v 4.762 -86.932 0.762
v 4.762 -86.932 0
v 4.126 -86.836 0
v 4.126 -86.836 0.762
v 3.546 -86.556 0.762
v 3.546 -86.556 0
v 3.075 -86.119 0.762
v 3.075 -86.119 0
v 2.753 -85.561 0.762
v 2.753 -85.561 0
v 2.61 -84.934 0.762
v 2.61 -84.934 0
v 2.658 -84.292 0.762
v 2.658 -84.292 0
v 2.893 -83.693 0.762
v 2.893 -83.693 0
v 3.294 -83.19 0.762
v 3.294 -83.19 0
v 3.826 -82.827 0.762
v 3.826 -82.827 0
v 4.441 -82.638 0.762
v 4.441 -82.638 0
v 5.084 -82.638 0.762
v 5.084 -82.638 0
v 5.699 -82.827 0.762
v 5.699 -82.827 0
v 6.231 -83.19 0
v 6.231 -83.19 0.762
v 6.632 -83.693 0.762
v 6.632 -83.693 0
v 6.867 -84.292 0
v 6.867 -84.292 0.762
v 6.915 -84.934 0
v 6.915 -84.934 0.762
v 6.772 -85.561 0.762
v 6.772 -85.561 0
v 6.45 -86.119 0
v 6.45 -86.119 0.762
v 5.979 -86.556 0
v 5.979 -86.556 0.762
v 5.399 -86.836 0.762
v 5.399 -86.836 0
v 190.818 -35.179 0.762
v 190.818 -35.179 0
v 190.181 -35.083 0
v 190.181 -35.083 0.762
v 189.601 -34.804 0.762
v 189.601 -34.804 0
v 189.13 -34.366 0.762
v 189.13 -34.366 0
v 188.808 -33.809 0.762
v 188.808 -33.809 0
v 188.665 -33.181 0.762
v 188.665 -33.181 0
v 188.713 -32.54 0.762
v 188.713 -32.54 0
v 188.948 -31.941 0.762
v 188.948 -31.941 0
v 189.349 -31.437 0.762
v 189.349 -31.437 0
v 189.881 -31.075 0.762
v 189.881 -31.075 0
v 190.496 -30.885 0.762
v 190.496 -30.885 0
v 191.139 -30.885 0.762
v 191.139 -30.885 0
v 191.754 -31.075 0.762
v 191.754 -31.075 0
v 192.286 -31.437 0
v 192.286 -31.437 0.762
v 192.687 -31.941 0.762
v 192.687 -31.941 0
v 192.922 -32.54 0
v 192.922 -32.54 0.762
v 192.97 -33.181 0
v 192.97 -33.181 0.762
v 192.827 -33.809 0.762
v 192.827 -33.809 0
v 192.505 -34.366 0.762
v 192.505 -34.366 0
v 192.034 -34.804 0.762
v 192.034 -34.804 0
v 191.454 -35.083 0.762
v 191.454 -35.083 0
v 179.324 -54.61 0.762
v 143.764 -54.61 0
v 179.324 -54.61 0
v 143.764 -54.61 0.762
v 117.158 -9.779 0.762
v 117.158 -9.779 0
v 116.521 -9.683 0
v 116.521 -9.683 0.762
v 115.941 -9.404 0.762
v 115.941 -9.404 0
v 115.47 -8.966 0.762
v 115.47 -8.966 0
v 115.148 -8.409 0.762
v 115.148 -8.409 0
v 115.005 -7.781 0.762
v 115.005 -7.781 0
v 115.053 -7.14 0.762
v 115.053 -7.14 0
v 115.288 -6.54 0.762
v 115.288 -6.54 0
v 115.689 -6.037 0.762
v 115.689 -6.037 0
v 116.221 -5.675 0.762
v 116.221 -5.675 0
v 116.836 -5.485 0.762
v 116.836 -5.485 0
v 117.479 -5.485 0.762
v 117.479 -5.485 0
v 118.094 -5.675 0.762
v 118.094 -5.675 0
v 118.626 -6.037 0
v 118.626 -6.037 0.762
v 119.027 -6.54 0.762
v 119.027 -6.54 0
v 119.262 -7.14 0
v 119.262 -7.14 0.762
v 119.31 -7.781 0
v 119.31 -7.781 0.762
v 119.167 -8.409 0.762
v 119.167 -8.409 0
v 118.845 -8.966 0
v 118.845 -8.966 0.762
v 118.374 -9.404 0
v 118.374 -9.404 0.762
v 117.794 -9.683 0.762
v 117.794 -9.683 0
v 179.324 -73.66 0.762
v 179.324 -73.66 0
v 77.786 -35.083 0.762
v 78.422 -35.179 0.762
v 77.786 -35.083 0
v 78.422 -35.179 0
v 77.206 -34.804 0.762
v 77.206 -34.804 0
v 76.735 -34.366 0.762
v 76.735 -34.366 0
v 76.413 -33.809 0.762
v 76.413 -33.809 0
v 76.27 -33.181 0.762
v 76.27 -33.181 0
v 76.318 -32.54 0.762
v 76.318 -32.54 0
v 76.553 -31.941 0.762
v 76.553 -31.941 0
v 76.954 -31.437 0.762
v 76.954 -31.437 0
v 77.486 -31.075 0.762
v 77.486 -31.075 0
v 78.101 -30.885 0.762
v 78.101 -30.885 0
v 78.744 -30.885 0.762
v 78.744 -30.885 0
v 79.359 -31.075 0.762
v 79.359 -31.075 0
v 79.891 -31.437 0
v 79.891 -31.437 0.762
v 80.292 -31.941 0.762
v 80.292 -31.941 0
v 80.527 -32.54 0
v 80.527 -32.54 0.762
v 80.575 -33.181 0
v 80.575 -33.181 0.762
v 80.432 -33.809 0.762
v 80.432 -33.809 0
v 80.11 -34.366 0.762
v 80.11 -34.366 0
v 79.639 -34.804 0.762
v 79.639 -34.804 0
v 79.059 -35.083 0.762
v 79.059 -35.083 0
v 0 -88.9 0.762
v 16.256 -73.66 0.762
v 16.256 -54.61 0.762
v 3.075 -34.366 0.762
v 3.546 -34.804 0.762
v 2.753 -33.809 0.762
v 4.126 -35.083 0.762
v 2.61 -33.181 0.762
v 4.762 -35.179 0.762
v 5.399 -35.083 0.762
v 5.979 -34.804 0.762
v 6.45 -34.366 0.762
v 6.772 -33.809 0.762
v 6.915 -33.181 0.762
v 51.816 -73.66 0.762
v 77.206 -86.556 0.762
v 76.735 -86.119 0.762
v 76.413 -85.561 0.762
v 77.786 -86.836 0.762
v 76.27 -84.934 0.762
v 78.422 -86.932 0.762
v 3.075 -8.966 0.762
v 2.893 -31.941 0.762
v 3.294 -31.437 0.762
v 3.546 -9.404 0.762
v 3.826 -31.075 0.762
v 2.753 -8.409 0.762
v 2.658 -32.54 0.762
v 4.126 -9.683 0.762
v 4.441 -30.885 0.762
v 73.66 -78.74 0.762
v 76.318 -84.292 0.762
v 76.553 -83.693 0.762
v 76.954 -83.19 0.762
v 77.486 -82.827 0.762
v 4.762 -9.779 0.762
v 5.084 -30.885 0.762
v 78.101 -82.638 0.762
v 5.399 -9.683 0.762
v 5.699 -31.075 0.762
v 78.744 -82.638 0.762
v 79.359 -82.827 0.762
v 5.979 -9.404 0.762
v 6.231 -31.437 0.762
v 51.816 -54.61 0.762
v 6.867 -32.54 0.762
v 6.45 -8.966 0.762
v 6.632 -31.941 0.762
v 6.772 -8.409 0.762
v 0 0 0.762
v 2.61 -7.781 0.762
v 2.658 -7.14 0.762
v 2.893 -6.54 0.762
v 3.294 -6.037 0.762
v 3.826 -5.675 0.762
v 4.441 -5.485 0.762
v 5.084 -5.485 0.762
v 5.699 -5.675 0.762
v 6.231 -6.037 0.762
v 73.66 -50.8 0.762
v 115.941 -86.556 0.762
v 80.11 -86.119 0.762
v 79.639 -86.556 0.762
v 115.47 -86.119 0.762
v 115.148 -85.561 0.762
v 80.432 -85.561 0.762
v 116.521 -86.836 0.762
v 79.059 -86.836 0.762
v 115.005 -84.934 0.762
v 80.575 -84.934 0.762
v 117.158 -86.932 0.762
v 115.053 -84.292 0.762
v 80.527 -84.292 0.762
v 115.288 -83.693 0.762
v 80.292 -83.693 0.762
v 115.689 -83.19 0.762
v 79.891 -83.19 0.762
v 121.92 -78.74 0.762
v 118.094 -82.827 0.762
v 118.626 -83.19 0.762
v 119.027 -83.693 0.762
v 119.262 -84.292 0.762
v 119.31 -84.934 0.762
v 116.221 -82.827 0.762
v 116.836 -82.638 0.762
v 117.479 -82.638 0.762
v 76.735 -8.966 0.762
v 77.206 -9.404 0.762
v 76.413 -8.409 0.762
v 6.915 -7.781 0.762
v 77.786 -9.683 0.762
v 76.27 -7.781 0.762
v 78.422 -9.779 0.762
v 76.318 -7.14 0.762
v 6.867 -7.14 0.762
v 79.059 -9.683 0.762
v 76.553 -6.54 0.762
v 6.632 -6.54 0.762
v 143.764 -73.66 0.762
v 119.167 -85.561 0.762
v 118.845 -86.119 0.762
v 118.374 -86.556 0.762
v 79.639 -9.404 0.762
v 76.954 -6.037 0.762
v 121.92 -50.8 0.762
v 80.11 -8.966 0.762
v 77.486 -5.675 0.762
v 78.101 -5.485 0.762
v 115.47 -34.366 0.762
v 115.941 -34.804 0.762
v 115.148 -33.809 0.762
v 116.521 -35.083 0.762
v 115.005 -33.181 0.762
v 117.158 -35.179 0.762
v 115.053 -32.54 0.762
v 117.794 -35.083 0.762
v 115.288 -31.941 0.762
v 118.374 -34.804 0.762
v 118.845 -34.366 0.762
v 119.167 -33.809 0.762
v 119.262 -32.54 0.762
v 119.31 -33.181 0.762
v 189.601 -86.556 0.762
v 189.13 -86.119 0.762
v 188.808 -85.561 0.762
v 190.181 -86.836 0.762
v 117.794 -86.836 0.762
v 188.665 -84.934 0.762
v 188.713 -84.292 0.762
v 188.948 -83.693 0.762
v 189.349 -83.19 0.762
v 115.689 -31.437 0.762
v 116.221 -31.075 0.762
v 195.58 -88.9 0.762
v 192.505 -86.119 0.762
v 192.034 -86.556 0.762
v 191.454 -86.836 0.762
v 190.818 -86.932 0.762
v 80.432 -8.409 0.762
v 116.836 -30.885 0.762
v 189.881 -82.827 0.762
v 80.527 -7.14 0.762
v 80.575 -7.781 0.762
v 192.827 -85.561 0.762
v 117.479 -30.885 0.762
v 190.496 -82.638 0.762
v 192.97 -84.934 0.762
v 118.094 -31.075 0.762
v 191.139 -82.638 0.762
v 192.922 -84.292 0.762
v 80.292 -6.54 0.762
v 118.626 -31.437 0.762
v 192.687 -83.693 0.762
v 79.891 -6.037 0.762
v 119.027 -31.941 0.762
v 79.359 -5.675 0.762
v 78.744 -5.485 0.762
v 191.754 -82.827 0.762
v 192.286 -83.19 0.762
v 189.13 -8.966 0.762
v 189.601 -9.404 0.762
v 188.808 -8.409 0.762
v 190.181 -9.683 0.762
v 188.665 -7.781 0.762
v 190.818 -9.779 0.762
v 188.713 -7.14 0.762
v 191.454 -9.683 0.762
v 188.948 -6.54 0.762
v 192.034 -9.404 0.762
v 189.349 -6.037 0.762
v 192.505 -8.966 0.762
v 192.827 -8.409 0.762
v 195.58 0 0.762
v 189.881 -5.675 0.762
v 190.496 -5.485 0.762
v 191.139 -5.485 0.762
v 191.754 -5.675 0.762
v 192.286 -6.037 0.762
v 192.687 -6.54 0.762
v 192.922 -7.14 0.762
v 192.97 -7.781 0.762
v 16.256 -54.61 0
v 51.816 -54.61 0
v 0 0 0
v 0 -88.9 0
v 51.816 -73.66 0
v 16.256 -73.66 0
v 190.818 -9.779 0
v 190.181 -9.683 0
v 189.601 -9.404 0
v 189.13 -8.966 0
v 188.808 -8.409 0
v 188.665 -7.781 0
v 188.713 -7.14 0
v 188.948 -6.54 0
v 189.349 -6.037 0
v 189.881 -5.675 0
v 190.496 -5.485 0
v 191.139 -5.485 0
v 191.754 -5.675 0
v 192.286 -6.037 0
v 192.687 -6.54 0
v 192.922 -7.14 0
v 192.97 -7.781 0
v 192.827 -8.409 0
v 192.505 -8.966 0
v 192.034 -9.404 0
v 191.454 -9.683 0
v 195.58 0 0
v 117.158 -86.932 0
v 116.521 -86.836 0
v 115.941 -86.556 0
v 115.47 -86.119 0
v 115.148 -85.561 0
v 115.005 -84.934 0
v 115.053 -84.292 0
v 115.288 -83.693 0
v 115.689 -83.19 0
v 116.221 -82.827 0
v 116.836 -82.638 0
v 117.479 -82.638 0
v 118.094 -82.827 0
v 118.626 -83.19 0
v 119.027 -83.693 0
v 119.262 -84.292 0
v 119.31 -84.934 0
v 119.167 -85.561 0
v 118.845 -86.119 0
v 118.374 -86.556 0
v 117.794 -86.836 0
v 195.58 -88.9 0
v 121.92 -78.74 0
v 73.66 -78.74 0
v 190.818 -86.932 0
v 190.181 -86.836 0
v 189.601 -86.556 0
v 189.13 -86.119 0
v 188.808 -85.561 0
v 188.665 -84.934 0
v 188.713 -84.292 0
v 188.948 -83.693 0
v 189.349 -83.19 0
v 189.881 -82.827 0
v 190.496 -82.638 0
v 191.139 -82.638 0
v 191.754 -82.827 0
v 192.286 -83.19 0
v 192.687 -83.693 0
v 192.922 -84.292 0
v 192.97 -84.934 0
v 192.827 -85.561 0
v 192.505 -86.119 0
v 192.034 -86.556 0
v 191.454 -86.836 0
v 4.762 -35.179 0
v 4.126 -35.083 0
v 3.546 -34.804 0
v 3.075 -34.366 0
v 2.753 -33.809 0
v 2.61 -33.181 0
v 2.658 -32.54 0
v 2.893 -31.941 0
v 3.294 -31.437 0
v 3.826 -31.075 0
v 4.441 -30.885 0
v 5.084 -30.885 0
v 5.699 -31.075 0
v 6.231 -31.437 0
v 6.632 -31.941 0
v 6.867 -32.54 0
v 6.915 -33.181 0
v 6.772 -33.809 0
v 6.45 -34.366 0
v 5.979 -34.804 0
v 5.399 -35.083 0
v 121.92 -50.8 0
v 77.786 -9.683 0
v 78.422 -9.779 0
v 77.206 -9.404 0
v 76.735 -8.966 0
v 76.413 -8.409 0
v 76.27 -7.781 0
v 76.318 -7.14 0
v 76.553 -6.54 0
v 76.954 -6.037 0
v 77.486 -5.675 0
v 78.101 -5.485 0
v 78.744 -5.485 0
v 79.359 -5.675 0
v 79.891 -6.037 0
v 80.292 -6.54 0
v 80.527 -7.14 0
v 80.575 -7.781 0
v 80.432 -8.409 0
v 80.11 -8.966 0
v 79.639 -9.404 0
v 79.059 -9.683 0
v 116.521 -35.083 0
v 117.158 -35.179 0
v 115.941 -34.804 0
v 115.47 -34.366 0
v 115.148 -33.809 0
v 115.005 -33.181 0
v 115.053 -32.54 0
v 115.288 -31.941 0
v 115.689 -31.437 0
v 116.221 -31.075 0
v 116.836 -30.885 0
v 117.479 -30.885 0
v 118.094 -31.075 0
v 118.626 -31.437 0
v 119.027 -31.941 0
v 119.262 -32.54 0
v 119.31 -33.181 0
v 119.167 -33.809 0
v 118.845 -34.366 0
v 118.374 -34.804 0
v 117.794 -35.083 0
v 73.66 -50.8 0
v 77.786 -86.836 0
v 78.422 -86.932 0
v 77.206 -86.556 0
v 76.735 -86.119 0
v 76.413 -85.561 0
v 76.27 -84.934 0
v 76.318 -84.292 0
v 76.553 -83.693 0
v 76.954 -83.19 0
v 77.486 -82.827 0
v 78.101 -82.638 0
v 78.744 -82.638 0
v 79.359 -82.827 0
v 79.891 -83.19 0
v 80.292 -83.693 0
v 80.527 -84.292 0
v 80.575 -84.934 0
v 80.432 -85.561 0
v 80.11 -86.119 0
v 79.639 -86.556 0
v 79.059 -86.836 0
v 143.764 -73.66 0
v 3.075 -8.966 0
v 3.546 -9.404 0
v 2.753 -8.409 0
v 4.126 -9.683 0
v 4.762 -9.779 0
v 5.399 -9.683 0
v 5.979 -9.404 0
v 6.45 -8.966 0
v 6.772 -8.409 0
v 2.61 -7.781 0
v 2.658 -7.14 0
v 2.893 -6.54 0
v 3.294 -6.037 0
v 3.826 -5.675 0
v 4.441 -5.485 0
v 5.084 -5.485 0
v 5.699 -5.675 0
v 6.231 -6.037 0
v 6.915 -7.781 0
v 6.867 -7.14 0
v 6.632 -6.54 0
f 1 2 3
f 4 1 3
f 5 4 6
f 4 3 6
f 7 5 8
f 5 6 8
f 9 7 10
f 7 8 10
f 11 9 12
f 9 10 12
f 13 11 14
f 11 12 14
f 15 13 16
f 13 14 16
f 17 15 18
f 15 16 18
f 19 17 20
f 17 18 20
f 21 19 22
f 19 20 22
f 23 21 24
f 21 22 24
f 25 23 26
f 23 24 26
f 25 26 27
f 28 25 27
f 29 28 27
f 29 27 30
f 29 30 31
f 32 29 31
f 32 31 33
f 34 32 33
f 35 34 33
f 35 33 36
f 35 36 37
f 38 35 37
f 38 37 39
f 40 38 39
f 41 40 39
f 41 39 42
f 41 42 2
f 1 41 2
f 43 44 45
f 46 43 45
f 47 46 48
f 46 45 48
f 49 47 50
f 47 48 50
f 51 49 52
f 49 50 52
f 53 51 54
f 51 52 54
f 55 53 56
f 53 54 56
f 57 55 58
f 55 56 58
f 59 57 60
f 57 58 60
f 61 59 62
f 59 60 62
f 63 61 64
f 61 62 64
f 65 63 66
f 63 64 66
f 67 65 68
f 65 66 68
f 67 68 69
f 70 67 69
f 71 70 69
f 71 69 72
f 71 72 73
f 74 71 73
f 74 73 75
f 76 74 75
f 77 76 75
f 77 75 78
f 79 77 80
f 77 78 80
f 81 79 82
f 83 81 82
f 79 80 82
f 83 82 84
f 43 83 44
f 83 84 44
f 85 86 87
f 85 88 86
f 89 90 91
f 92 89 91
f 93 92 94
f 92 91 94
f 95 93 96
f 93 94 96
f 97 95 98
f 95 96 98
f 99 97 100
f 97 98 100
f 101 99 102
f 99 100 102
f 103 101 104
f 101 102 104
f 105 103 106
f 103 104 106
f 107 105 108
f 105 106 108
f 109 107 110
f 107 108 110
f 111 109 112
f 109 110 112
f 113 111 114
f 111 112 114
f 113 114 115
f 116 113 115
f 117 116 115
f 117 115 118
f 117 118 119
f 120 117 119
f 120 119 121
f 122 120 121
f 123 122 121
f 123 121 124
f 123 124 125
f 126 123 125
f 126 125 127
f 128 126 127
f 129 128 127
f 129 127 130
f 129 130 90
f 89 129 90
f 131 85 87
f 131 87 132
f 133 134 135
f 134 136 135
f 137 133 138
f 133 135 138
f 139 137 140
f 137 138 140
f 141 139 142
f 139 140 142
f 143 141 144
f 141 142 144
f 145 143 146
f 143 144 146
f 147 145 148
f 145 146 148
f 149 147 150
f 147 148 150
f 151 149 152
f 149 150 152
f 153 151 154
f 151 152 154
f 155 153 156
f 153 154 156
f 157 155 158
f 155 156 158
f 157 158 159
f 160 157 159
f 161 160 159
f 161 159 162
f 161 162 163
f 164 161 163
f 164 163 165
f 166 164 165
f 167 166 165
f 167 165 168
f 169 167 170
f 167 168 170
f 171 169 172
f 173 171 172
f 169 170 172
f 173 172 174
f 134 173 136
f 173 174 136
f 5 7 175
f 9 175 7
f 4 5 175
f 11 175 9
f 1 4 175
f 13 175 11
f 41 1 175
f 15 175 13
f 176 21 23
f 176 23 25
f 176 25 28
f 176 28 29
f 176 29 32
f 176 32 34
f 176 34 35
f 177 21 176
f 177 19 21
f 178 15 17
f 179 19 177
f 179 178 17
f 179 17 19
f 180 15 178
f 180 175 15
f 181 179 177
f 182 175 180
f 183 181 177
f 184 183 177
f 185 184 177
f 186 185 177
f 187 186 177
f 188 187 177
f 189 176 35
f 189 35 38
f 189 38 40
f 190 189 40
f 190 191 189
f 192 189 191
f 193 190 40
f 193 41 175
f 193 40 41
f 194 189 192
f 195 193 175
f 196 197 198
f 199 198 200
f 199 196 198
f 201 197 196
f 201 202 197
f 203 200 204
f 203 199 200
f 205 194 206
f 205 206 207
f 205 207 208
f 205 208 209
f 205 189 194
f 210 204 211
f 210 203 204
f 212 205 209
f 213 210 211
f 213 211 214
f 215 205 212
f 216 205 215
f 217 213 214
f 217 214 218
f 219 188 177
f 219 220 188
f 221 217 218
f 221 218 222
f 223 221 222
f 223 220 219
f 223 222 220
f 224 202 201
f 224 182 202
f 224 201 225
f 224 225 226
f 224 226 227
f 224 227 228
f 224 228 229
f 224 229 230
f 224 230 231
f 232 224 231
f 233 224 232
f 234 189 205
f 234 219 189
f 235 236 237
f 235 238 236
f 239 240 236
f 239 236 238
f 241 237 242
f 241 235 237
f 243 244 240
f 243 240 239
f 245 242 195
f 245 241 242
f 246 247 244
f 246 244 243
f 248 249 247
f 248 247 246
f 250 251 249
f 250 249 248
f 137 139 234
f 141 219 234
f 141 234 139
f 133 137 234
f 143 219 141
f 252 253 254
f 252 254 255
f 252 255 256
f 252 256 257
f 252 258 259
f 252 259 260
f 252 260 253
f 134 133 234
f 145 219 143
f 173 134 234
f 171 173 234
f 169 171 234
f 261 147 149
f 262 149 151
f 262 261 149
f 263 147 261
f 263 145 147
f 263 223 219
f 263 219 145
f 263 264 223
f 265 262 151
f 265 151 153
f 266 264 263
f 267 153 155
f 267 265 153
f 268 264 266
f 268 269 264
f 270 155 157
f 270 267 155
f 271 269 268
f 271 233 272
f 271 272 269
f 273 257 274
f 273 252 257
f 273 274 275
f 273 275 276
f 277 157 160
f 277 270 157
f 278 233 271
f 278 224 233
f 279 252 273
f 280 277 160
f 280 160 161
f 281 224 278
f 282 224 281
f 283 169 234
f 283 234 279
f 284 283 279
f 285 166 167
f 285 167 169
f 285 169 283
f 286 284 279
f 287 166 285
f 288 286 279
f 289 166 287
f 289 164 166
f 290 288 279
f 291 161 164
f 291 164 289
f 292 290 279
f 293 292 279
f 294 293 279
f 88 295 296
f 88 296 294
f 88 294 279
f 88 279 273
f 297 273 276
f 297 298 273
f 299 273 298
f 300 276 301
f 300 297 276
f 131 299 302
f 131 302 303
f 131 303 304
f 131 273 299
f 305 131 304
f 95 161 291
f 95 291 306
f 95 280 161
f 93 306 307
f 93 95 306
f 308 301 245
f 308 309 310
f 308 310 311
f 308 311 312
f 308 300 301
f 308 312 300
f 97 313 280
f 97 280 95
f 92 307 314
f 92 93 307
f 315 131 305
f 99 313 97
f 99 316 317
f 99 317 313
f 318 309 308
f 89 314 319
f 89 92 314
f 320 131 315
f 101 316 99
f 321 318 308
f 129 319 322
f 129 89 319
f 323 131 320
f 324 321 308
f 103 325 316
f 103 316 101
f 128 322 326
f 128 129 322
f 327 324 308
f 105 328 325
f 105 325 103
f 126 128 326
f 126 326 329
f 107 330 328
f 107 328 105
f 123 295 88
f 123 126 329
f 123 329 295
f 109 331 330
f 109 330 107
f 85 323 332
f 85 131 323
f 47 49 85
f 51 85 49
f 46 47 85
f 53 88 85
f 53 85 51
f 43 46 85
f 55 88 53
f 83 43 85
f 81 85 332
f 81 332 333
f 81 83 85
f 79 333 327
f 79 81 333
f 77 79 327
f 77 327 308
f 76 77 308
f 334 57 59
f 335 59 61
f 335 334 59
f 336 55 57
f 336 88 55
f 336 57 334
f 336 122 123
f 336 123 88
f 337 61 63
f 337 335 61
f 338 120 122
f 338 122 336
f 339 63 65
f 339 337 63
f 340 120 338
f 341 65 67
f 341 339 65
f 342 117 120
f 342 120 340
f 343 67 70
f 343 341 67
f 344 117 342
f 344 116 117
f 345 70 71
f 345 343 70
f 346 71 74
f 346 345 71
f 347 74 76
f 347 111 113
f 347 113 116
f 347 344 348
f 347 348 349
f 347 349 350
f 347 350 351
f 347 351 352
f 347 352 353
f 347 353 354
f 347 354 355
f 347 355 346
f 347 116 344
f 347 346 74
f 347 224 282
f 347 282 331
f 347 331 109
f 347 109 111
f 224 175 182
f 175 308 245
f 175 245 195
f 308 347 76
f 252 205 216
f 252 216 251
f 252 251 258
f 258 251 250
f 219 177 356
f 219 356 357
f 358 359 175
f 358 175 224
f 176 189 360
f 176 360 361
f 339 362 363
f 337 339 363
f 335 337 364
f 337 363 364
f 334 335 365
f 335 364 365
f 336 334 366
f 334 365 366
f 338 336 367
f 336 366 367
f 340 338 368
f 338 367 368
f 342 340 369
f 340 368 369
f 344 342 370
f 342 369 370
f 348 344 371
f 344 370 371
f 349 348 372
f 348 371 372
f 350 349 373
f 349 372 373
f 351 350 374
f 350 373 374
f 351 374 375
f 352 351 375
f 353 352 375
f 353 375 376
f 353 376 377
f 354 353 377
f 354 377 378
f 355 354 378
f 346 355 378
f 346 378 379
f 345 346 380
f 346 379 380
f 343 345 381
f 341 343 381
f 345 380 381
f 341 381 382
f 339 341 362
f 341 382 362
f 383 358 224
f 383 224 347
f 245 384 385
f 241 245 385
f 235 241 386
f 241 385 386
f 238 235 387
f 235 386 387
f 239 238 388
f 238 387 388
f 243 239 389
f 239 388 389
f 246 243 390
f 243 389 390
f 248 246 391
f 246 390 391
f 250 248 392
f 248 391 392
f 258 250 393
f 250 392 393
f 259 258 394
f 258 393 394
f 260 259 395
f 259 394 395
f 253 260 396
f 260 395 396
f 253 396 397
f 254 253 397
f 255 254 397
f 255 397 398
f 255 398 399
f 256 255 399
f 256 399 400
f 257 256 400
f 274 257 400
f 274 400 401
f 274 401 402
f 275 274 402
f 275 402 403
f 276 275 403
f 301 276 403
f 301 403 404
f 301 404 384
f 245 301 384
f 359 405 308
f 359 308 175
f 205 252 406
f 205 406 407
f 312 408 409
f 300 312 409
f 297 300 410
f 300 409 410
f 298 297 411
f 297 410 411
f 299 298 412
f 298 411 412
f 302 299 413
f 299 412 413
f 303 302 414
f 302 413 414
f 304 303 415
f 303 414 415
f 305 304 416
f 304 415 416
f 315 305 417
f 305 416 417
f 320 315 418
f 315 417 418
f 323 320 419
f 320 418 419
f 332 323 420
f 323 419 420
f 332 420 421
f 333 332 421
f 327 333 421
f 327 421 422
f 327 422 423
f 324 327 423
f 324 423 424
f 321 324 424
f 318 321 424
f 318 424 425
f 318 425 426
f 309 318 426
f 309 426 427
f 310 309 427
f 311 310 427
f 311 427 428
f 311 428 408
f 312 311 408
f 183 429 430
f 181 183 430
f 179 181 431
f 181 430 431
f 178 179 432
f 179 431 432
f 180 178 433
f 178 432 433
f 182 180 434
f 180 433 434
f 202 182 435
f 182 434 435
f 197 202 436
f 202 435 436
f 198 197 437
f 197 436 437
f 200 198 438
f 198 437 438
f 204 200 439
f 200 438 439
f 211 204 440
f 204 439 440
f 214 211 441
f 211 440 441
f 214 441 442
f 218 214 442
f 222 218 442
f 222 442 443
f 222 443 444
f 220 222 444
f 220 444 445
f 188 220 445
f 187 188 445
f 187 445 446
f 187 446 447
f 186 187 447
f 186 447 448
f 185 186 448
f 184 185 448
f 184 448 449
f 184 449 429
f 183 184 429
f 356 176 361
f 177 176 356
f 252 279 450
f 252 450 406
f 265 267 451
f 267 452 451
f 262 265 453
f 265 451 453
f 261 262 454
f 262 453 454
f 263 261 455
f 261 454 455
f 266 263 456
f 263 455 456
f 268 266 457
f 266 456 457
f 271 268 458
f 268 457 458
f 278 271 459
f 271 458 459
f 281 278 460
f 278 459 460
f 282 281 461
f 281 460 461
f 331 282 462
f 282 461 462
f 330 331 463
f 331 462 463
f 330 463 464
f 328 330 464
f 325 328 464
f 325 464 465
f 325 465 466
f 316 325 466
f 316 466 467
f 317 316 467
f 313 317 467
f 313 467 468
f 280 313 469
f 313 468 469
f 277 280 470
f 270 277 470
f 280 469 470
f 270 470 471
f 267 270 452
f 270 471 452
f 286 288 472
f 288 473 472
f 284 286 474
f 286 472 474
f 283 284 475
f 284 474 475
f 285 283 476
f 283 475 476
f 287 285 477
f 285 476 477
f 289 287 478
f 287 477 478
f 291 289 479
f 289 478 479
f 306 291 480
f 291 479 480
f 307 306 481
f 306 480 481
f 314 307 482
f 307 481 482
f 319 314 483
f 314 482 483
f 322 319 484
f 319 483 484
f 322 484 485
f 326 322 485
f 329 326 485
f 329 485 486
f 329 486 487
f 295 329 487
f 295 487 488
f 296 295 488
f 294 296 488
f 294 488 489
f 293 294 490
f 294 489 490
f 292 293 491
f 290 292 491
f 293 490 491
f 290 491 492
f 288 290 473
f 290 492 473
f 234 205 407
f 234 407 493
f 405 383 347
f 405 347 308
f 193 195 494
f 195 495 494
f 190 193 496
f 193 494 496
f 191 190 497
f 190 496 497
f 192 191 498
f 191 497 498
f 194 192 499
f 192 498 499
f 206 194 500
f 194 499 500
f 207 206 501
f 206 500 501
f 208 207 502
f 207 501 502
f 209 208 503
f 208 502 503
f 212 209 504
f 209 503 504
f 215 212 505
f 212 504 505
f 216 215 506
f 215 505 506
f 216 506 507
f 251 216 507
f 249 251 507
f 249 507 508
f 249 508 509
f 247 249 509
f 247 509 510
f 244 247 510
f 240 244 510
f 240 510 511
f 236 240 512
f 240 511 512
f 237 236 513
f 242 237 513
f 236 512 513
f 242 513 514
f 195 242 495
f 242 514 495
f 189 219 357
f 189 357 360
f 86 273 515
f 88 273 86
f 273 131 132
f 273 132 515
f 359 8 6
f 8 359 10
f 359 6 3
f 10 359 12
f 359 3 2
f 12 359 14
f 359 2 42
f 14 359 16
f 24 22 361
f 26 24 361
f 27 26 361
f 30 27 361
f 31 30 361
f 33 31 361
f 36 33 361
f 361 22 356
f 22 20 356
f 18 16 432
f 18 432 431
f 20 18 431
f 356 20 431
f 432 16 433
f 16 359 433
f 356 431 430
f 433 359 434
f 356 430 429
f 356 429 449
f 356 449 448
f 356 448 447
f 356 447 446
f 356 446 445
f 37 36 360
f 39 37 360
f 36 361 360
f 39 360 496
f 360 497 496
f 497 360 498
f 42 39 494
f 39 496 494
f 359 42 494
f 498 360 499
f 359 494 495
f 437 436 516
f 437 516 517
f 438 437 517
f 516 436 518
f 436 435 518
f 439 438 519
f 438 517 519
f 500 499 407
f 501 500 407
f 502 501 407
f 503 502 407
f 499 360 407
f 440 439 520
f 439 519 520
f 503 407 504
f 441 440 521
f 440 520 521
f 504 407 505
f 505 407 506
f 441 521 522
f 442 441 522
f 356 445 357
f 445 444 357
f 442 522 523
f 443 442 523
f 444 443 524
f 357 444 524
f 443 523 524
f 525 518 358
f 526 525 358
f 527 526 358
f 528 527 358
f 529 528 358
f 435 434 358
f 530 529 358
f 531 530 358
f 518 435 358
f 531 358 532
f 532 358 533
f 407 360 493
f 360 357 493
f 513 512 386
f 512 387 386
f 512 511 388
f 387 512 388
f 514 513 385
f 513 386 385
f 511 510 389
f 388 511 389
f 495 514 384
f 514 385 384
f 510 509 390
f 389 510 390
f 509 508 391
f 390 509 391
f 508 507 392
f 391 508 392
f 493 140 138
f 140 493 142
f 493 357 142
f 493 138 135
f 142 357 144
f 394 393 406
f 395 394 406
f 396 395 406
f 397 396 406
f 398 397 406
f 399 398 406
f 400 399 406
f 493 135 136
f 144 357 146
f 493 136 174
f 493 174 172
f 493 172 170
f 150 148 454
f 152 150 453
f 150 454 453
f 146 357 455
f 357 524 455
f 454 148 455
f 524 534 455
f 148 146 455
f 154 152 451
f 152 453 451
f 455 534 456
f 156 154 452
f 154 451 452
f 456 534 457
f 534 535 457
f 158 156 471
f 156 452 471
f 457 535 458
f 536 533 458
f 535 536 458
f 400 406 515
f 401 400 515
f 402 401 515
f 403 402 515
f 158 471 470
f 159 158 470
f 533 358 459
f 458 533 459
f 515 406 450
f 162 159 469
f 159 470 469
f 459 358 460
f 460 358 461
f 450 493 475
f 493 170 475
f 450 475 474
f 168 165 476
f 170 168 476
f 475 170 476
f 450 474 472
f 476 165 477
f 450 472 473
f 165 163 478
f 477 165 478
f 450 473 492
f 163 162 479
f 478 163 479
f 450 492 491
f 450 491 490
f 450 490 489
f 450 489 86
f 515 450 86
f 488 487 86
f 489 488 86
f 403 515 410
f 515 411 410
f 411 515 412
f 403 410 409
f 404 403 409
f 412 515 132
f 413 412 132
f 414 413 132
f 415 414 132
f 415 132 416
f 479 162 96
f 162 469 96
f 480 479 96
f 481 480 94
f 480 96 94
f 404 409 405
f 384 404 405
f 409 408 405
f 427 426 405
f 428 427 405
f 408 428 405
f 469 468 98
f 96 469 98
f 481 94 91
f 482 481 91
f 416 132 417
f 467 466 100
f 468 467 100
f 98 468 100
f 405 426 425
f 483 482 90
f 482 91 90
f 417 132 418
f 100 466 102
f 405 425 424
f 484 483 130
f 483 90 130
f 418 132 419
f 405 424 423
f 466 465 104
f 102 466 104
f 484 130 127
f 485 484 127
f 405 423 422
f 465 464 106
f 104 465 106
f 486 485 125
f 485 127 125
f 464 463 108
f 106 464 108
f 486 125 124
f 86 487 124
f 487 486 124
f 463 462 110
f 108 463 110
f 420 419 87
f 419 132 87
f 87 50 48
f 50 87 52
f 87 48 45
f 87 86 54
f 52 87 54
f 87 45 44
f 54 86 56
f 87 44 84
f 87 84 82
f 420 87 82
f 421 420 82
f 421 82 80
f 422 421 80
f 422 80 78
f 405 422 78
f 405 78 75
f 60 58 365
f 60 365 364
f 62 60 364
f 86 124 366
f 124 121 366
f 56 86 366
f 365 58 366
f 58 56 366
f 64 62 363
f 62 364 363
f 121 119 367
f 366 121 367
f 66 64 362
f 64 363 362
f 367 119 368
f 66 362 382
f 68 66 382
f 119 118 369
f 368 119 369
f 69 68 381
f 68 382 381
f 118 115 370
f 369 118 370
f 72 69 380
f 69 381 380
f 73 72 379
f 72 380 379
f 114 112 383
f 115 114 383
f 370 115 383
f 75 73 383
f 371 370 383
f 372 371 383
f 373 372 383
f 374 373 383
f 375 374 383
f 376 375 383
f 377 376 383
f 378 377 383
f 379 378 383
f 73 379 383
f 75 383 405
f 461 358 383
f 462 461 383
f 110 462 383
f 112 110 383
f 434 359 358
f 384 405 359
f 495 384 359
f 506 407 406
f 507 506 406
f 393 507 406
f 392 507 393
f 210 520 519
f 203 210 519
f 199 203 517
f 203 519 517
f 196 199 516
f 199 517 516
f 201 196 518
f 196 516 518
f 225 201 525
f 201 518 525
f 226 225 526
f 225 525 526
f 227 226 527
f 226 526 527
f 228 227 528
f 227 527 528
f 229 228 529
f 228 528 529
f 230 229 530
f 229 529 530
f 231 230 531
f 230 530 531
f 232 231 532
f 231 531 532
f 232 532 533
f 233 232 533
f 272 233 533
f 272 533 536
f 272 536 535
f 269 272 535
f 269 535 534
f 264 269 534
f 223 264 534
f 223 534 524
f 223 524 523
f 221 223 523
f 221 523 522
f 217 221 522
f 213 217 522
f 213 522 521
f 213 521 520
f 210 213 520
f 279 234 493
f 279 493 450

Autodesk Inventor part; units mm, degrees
ref_plane "YZ Plane" through (0, 0, 0) normal (1, 0, 0) x (0, 1, 0)
ref_plane "XZ Plane" through (0, 0, 0) normal (0, 1, 0) x (-1, 0, 0)
ref_plane "XY Plane" through (0, 0, 0) normal (0, 0, 1) x (1, 0, 0)
sketch "Sketch1" plane through (0, 0, 0) normal (0, 0, 1) x (1, 0, 0)
  line L0 (0, 0) -> (195.58, 0)
  line L1 (195.58, 0) -> (195.58, -88.9)
  line L2 (195.58, -88.9) -> (0, -88.9)
  line L3 (0, -88.9) -> (0, 0)
  dimension "d0" = 195.58
  dimension "d1" = 88.9
extrude "Extrusion1" add sketch "Sketch1" along normal blind 0.762
sketch "Sketch9" plane through (0, 0, 0.762) normal (0, 0, 1) x (1, 0, 0)
  line L0 (195.58, 0) -> (195.58, -88.9) projected
  line L1 (0, -88.9) -> (0, 0) projected
  line L2 (195.58, -88.9) -> (0, -88.9) projected
  line L3 (16.256, -54.61) -> (51.816, -54.61)
  line L4 (51.816, -54.61) -> (51.816, -73.66)
  line L5 (51.816, -73.66) -> (16.256, -73.66)
  line L6 (16.256, -73.66) -> (16.256, -54.61)
  line L7 (143.764, -54.61) -> (179.324, -54.61)
  line L8 (179.324, -54.61) -> (179.324, -73.66)
  line L9 (179.324, -73.66) -> (143.764, -73.66)
  line L10 (143.764, -73.66) -> (143.764, -54.61)
  line L11 (73.66, -50.8) -> (121.92, -50.8)
  line L12 (121.92, -50.8) -> (121.92, -78.74)
  line L13 (121.92, -78.74) -> (73.66, -78.74)
  line L14 (73.66, -78.74) -> (73.66, -50.8)
  dimension "d105" = 16.256
  dimension "d106" = 19.05
  dimension "d107" = 35.56
  dimension "d108" = 16.256
  dimension "d109" = 19.05
  dimension "d110" = 35.56
  dimension "d111" = 15.24
  dimension "d112" = 15.24
  dimension "d113" = 48.26
  dimension "d114" = 27.94
  dimension "d115" = 73.66
  dimension "d116" = 73.66
  dimension "d117" = 10.16
extrude "Extrusion4" cut sketch "Sketch9" against normal blind 25.4
sketch "Sketch10" plane through (0, 0, 0.762) normal (0, 0, 1) x (1, 0, 0)
  circle A0 centre (4.7625, -84.7725) radius 2.2479 projected
  circle A1 centre (78.4225, -84.7725) radius 2.2479 projected
  circle A2 centre (117.1575, -84.7725) radius 2.2479 projected
  circle A3 centre (190.8175, -84.7725) radius 2.2479 projected
  line L0 (195.58, -88.9) -> (0, -88.9) projected
  line L1 (0, -37.5396) -> (9.525, -37.5396) projected
  point P0 (4.7625, -33.02)
  point P1 (4.7625, -7.62)
  point P2 (78.4225, -7.62)
  point P3 (78.4225, -33.02)
  point P4 (117.1575, -33.02)
  point P5 (117.1575, -7.62)
  point P6 (190.8175, -33.02)
  point P7 (190.8175, -7.62)
  dimension "d127" = 81.28
  dimension "d128" = 55.88
  dimension "d129" = 55.88
  dimension "d130" = 81.28
  dimension "d131" = 81.28
  dimension "d132" = 55.88
  dimension "d133" = 55.88
  dimension "d134" = 81.28
hole "Hole5" at (190.8175, -84.7725, 0.762) at (117.1575, -84.7725, 0.762) at (78.4225, -84.7725, 0.762) at (4.7625, -84.7725, 0.762) at (4.7625, -7.62, 0.762) at (4.7625, -33.02, 0.762) at (78.4225, -33.02, 0.762) at (78.4225, -7.62, 0.762) at (117.1575, -7.62, 0.762) at (117.1575, -33.02, 0.762) at (190.8175, -33.02, 0.762) at (190.8175, -7.62, 0.762) direction (0, 0, -1) diameter 4.318 end through all clearance for "Flat Head Machine Screw (82)" size "#8" standard "Ansi Unified Screw Threads"
properties part number "ChassisFrontPlate" material "Steel"
